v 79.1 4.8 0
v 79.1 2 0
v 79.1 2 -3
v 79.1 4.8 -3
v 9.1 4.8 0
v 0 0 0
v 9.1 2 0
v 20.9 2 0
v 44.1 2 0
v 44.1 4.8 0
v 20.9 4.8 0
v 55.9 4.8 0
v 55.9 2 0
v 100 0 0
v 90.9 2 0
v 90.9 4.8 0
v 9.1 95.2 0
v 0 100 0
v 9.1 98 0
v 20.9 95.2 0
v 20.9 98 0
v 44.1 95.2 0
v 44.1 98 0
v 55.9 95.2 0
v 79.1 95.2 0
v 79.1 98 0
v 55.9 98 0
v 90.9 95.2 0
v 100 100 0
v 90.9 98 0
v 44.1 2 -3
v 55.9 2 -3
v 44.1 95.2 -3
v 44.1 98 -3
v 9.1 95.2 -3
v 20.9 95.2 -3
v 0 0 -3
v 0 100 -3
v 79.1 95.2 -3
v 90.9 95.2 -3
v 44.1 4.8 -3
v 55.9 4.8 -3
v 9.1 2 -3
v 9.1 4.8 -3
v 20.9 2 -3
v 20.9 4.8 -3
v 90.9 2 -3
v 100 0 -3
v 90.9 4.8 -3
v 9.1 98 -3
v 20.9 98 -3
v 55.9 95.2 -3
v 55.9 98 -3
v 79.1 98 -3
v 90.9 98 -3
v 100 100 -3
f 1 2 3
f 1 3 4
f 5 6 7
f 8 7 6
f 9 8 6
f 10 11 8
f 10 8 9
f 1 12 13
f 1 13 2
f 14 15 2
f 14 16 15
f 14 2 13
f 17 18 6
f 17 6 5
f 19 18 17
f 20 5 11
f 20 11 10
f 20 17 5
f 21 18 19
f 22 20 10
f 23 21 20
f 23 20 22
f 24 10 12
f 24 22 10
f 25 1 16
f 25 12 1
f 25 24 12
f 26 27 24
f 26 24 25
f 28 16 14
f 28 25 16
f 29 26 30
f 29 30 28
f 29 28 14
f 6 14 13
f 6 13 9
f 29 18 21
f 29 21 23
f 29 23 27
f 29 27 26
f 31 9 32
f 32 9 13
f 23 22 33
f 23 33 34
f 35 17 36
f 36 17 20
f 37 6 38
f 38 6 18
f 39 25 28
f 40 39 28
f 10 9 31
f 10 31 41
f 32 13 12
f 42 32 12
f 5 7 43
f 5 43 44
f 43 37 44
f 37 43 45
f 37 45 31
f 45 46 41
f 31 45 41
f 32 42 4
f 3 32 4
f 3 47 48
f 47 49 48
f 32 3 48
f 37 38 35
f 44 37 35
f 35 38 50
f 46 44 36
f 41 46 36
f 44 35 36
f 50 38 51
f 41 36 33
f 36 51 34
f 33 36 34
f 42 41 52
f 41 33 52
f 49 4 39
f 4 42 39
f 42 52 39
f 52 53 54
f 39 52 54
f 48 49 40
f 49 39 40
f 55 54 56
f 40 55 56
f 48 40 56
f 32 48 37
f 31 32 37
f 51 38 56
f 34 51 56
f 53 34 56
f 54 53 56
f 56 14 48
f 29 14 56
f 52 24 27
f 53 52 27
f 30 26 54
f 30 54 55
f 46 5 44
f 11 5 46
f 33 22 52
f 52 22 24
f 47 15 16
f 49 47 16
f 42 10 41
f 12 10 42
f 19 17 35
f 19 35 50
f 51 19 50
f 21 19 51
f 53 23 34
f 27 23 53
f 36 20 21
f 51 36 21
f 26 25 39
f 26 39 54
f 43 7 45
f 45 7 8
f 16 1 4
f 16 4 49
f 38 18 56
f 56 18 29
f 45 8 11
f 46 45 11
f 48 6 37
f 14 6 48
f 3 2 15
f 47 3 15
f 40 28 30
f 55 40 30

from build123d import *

# Parameters (mm, degrees)
SKETCH_1_W      = 100
SKETCH_1_H      = 100
SKETCH_1_W_2    = 11.8
SKETCH_1_H_2    = 2.8
EXTRUDE_1_DEPTH = 3


with BuildPart() as part:
    # Эскиз1 → Бобышка-Вытянуть1 (new body)
    with BuildSketch(Plane.XY):
        with Locations((50, 50)):
            Rectangle(SKETCH_1_W, SKETCH_1_H)
        with Locations((15, 3.4)):
            Rectangle(SKETCH_1_W_2, SKETCH_1_H_2, mode=Mode.SUBTRACT)
        with Locations((50, 3.4)):
            Rectangle(SKETCH_1_W_2, SKETCH_1_H_2, mode=Mode.SUBTRACT)
        with Locations((85, 3.4)):
            Rectangle(SKETCH_1_W_2, SKETCH_1_H_2, mode=Mode.SUBTRACT)
        with Locations((85, 96.6)):
            Rectangle(SKETCH_1_W_2, SKETCH_1_H_2, mode=Mode.SUBTRACT)
        with Locations((50, 96.6)):
            Rectangle(SKETCH_1_W_2, SKETCH_1_H_2, mode=Mode.SUBTRACT)
        with Locations((15, 96.6)):
            Rectangle(SKETCH_1_W_2, SKETCH_1_H_2, mode=Mode.SUBTRACT)
    extrude(amount=-EXTRUDE_1_DEPTH)


solid = part.part
